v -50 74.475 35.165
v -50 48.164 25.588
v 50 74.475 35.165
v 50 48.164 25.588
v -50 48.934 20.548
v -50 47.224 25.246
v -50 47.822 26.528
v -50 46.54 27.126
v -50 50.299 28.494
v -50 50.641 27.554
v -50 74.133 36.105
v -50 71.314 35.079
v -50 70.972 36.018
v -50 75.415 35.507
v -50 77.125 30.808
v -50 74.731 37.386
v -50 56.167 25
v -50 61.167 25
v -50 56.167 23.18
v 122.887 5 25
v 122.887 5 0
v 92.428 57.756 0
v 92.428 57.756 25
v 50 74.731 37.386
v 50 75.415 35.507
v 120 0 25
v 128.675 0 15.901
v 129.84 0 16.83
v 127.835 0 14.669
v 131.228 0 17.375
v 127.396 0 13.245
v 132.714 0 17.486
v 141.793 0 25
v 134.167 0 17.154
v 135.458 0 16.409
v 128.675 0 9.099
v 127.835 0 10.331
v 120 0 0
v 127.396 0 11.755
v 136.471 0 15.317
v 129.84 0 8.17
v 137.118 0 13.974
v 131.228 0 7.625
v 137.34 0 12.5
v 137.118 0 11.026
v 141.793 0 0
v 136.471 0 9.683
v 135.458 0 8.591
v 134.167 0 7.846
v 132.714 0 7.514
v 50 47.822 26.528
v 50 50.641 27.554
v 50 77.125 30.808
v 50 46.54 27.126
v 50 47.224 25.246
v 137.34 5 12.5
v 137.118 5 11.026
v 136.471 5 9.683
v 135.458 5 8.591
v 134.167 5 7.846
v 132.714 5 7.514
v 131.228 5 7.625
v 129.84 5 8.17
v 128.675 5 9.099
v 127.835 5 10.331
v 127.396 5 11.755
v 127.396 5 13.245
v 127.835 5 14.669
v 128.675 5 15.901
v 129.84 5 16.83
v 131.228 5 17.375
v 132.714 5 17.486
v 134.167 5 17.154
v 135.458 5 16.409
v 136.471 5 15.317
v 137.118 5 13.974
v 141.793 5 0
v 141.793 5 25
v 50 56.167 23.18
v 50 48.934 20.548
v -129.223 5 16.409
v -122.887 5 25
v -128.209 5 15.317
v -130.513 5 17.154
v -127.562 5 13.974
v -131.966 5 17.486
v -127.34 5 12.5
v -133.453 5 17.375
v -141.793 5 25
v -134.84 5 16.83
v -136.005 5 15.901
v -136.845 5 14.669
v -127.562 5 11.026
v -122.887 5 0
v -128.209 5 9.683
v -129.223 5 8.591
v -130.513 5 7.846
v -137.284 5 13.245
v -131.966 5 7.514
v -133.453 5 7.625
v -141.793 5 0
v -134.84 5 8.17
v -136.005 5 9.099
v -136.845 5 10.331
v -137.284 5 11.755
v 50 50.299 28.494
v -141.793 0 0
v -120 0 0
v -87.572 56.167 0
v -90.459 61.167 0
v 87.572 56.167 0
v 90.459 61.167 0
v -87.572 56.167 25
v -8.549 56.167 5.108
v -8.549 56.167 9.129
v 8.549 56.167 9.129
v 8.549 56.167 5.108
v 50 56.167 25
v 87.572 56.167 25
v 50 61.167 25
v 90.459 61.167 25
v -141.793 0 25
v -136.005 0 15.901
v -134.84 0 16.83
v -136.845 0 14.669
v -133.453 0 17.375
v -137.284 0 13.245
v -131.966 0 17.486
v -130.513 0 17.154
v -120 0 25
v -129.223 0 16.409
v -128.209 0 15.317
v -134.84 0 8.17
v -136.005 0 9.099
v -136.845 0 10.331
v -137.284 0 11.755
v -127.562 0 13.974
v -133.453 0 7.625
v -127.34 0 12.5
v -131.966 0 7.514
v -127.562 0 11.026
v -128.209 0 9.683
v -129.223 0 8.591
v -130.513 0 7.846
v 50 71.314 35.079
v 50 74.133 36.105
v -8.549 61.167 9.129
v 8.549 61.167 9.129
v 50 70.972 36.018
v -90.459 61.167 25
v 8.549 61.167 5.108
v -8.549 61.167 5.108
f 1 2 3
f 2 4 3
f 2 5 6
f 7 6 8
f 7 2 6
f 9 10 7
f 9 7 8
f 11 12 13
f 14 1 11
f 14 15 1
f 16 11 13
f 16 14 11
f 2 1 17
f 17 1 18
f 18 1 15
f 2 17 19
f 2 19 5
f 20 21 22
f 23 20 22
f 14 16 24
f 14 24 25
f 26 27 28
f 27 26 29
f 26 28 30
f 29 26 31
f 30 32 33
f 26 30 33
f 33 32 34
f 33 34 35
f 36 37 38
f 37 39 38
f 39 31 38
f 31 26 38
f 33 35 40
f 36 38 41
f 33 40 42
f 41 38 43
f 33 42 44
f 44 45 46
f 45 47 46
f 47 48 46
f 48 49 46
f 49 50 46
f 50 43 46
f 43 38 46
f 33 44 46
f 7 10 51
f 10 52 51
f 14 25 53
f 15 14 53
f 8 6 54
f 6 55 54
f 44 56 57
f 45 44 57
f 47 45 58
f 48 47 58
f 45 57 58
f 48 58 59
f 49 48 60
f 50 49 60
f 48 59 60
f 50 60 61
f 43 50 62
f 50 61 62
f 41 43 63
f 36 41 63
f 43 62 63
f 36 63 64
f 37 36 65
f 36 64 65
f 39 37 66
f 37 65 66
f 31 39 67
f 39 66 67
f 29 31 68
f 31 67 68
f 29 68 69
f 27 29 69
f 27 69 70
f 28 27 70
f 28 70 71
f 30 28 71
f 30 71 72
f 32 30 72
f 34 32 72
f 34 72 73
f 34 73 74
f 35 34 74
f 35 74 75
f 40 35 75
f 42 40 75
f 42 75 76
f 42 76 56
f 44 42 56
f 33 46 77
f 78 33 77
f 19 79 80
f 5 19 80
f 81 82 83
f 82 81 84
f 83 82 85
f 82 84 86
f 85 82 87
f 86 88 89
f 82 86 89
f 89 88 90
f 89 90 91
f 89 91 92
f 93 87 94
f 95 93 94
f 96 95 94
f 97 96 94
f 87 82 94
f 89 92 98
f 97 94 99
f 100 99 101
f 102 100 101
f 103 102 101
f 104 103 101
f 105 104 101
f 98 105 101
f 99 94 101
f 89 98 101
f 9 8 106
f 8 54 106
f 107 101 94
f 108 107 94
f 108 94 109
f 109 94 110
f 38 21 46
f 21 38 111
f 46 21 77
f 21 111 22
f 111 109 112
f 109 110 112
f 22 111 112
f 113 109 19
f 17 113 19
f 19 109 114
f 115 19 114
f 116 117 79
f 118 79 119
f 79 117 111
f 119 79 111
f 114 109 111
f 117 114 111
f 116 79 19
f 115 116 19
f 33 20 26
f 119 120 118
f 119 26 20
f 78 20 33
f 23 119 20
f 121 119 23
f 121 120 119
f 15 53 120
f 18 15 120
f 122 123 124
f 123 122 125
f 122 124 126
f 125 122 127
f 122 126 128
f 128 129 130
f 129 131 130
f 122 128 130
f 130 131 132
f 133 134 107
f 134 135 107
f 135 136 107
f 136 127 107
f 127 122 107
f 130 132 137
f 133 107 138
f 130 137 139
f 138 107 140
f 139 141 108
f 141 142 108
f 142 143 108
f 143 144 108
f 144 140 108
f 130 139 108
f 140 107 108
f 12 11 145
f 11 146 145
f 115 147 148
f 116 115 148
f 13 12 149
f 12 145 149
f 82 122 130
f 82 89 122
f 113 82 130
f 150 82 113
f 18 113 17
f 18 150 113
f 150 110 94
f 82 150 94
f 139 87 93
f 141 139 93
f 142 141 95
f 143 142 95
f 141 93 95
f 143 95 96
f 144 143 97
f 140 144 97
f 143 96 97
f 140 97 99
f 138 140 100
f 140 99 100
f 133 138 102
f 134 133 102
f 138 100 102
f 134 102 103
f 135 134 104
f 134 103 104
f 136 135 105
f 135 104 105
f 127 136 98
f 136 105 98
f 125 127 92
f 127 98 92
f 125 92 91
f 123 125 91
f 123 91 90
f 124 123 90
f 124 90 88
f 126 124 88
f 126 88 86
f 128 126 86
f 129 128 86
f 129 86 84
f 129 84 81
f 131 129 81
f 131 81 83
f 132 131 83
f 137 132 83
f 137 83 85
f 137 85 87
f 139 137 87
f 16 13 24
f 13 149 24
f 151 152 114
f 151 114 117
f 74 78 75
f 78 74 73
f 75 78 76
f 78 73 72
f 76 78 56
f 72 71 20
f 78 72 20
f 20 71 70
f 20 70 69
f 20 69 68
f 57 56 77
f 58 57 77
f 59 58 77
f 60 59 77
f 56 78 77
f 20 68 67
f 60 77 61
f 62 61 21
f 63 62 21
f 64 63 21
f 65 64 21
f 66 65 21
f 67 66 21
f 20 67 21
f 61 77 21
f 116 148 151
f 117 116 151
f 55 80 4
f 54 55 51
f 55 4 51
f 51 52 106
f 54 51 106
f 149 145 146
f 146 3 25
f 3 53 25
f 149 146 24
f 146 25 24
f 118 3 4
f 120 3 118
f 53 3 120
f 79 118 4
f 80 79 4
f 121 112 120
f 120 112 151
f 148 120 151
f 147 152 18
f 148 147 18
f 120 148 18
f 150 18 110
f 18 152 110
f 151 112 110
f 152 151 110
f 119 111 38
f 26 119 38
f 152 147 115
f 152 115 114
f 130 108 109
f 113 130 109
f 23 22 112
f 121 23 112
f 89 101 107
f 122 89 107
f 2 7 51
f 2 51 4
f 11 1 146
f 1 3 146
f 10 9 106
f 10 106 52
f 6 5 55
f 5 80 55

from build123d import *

# Parameters (mm, degrees)
BOSS_EXTRUDE1_DEPTH = 25
SKETCH2_R           = 5
SKETCH2_W           = 17.097123546
SKETCH2_H           = 4.020670456
CUT_EXTRUDE1_DEPTH  = 100
BOSS_EXTRUDE2_DEPTH = 50


with BuildPart() as part:
    # Sketch1 → Boss-Extrude1 (new body)
    with BuildSketch(Plane.XY):
        Polygon((-120, 0), (-87.572195572, 56.166604847), (87.572195572, 56.166604847), (120, 0), (126.793465802, 0), (141.793465802, 0), (141.793465802, 5), (122.886751346, 5), (92.427804428, 57.756443607), (90.458946918, 61.166604847), (-90.458946918, 61.166604847), (-122.886751346, 5), (-141.793465802, 5), (-141.793465802, 0), (-126.793465802, 0), align=None)
    extrude(amount=BOSS_EXTRUDE1_DEPTH)

    # Sketch2 → Cut-Extrude1 (cut, symmetric)
    with BuildSketch(Plane(origin=(0, 5, 0), x_dir=(1, 0, 0), z_dir=(0, 1, 0))):
        with Locations((132.340108574, -12.5)):
            Circle(SKETCH2_R)
        with Locations((-132.340108574, -12.5)):
            Circle(SKETCH2_R)
        with Locations((0, -7.118249896)):
            Rectangle(SKETCH2_W, SKETCH2_H)
    extrude(amount=CUT_EXTRUDE1_DEPTH, both=True, mode=Mode.SUBTRACT)

    # Sketch3 → Boss-Extrude2 (add, symmetric)
    with BuildSketch(Plane(origin=(0, 0, 0), x_dir=(0, 0, -1), z_dir=(1, 0, 0))):
        Polygon((-30.808478502, 77.125268372), (-20.547874202, 48.934489749), (-25.246337306, 47.224389032), (-27.125722548, 46.540348745), (-28.493803121, 50.299119228), (-27.5541105, 50.641139372), (-26.52805007, 47.822061509), (-25.588357449, 48.164081653), (-35.164921463, 74.475475035), (-36.104614083, 74.133454891), (-35.078553653, 71.314377029), (-36.018246274, 70.972356886), (-37.386326847, 74.731127369), (-35.506941606, 75.415167656), align=None)
    extrude(amount=BOSS_EXTRUDE2_DEPTH, both=True)


solid = part.part
